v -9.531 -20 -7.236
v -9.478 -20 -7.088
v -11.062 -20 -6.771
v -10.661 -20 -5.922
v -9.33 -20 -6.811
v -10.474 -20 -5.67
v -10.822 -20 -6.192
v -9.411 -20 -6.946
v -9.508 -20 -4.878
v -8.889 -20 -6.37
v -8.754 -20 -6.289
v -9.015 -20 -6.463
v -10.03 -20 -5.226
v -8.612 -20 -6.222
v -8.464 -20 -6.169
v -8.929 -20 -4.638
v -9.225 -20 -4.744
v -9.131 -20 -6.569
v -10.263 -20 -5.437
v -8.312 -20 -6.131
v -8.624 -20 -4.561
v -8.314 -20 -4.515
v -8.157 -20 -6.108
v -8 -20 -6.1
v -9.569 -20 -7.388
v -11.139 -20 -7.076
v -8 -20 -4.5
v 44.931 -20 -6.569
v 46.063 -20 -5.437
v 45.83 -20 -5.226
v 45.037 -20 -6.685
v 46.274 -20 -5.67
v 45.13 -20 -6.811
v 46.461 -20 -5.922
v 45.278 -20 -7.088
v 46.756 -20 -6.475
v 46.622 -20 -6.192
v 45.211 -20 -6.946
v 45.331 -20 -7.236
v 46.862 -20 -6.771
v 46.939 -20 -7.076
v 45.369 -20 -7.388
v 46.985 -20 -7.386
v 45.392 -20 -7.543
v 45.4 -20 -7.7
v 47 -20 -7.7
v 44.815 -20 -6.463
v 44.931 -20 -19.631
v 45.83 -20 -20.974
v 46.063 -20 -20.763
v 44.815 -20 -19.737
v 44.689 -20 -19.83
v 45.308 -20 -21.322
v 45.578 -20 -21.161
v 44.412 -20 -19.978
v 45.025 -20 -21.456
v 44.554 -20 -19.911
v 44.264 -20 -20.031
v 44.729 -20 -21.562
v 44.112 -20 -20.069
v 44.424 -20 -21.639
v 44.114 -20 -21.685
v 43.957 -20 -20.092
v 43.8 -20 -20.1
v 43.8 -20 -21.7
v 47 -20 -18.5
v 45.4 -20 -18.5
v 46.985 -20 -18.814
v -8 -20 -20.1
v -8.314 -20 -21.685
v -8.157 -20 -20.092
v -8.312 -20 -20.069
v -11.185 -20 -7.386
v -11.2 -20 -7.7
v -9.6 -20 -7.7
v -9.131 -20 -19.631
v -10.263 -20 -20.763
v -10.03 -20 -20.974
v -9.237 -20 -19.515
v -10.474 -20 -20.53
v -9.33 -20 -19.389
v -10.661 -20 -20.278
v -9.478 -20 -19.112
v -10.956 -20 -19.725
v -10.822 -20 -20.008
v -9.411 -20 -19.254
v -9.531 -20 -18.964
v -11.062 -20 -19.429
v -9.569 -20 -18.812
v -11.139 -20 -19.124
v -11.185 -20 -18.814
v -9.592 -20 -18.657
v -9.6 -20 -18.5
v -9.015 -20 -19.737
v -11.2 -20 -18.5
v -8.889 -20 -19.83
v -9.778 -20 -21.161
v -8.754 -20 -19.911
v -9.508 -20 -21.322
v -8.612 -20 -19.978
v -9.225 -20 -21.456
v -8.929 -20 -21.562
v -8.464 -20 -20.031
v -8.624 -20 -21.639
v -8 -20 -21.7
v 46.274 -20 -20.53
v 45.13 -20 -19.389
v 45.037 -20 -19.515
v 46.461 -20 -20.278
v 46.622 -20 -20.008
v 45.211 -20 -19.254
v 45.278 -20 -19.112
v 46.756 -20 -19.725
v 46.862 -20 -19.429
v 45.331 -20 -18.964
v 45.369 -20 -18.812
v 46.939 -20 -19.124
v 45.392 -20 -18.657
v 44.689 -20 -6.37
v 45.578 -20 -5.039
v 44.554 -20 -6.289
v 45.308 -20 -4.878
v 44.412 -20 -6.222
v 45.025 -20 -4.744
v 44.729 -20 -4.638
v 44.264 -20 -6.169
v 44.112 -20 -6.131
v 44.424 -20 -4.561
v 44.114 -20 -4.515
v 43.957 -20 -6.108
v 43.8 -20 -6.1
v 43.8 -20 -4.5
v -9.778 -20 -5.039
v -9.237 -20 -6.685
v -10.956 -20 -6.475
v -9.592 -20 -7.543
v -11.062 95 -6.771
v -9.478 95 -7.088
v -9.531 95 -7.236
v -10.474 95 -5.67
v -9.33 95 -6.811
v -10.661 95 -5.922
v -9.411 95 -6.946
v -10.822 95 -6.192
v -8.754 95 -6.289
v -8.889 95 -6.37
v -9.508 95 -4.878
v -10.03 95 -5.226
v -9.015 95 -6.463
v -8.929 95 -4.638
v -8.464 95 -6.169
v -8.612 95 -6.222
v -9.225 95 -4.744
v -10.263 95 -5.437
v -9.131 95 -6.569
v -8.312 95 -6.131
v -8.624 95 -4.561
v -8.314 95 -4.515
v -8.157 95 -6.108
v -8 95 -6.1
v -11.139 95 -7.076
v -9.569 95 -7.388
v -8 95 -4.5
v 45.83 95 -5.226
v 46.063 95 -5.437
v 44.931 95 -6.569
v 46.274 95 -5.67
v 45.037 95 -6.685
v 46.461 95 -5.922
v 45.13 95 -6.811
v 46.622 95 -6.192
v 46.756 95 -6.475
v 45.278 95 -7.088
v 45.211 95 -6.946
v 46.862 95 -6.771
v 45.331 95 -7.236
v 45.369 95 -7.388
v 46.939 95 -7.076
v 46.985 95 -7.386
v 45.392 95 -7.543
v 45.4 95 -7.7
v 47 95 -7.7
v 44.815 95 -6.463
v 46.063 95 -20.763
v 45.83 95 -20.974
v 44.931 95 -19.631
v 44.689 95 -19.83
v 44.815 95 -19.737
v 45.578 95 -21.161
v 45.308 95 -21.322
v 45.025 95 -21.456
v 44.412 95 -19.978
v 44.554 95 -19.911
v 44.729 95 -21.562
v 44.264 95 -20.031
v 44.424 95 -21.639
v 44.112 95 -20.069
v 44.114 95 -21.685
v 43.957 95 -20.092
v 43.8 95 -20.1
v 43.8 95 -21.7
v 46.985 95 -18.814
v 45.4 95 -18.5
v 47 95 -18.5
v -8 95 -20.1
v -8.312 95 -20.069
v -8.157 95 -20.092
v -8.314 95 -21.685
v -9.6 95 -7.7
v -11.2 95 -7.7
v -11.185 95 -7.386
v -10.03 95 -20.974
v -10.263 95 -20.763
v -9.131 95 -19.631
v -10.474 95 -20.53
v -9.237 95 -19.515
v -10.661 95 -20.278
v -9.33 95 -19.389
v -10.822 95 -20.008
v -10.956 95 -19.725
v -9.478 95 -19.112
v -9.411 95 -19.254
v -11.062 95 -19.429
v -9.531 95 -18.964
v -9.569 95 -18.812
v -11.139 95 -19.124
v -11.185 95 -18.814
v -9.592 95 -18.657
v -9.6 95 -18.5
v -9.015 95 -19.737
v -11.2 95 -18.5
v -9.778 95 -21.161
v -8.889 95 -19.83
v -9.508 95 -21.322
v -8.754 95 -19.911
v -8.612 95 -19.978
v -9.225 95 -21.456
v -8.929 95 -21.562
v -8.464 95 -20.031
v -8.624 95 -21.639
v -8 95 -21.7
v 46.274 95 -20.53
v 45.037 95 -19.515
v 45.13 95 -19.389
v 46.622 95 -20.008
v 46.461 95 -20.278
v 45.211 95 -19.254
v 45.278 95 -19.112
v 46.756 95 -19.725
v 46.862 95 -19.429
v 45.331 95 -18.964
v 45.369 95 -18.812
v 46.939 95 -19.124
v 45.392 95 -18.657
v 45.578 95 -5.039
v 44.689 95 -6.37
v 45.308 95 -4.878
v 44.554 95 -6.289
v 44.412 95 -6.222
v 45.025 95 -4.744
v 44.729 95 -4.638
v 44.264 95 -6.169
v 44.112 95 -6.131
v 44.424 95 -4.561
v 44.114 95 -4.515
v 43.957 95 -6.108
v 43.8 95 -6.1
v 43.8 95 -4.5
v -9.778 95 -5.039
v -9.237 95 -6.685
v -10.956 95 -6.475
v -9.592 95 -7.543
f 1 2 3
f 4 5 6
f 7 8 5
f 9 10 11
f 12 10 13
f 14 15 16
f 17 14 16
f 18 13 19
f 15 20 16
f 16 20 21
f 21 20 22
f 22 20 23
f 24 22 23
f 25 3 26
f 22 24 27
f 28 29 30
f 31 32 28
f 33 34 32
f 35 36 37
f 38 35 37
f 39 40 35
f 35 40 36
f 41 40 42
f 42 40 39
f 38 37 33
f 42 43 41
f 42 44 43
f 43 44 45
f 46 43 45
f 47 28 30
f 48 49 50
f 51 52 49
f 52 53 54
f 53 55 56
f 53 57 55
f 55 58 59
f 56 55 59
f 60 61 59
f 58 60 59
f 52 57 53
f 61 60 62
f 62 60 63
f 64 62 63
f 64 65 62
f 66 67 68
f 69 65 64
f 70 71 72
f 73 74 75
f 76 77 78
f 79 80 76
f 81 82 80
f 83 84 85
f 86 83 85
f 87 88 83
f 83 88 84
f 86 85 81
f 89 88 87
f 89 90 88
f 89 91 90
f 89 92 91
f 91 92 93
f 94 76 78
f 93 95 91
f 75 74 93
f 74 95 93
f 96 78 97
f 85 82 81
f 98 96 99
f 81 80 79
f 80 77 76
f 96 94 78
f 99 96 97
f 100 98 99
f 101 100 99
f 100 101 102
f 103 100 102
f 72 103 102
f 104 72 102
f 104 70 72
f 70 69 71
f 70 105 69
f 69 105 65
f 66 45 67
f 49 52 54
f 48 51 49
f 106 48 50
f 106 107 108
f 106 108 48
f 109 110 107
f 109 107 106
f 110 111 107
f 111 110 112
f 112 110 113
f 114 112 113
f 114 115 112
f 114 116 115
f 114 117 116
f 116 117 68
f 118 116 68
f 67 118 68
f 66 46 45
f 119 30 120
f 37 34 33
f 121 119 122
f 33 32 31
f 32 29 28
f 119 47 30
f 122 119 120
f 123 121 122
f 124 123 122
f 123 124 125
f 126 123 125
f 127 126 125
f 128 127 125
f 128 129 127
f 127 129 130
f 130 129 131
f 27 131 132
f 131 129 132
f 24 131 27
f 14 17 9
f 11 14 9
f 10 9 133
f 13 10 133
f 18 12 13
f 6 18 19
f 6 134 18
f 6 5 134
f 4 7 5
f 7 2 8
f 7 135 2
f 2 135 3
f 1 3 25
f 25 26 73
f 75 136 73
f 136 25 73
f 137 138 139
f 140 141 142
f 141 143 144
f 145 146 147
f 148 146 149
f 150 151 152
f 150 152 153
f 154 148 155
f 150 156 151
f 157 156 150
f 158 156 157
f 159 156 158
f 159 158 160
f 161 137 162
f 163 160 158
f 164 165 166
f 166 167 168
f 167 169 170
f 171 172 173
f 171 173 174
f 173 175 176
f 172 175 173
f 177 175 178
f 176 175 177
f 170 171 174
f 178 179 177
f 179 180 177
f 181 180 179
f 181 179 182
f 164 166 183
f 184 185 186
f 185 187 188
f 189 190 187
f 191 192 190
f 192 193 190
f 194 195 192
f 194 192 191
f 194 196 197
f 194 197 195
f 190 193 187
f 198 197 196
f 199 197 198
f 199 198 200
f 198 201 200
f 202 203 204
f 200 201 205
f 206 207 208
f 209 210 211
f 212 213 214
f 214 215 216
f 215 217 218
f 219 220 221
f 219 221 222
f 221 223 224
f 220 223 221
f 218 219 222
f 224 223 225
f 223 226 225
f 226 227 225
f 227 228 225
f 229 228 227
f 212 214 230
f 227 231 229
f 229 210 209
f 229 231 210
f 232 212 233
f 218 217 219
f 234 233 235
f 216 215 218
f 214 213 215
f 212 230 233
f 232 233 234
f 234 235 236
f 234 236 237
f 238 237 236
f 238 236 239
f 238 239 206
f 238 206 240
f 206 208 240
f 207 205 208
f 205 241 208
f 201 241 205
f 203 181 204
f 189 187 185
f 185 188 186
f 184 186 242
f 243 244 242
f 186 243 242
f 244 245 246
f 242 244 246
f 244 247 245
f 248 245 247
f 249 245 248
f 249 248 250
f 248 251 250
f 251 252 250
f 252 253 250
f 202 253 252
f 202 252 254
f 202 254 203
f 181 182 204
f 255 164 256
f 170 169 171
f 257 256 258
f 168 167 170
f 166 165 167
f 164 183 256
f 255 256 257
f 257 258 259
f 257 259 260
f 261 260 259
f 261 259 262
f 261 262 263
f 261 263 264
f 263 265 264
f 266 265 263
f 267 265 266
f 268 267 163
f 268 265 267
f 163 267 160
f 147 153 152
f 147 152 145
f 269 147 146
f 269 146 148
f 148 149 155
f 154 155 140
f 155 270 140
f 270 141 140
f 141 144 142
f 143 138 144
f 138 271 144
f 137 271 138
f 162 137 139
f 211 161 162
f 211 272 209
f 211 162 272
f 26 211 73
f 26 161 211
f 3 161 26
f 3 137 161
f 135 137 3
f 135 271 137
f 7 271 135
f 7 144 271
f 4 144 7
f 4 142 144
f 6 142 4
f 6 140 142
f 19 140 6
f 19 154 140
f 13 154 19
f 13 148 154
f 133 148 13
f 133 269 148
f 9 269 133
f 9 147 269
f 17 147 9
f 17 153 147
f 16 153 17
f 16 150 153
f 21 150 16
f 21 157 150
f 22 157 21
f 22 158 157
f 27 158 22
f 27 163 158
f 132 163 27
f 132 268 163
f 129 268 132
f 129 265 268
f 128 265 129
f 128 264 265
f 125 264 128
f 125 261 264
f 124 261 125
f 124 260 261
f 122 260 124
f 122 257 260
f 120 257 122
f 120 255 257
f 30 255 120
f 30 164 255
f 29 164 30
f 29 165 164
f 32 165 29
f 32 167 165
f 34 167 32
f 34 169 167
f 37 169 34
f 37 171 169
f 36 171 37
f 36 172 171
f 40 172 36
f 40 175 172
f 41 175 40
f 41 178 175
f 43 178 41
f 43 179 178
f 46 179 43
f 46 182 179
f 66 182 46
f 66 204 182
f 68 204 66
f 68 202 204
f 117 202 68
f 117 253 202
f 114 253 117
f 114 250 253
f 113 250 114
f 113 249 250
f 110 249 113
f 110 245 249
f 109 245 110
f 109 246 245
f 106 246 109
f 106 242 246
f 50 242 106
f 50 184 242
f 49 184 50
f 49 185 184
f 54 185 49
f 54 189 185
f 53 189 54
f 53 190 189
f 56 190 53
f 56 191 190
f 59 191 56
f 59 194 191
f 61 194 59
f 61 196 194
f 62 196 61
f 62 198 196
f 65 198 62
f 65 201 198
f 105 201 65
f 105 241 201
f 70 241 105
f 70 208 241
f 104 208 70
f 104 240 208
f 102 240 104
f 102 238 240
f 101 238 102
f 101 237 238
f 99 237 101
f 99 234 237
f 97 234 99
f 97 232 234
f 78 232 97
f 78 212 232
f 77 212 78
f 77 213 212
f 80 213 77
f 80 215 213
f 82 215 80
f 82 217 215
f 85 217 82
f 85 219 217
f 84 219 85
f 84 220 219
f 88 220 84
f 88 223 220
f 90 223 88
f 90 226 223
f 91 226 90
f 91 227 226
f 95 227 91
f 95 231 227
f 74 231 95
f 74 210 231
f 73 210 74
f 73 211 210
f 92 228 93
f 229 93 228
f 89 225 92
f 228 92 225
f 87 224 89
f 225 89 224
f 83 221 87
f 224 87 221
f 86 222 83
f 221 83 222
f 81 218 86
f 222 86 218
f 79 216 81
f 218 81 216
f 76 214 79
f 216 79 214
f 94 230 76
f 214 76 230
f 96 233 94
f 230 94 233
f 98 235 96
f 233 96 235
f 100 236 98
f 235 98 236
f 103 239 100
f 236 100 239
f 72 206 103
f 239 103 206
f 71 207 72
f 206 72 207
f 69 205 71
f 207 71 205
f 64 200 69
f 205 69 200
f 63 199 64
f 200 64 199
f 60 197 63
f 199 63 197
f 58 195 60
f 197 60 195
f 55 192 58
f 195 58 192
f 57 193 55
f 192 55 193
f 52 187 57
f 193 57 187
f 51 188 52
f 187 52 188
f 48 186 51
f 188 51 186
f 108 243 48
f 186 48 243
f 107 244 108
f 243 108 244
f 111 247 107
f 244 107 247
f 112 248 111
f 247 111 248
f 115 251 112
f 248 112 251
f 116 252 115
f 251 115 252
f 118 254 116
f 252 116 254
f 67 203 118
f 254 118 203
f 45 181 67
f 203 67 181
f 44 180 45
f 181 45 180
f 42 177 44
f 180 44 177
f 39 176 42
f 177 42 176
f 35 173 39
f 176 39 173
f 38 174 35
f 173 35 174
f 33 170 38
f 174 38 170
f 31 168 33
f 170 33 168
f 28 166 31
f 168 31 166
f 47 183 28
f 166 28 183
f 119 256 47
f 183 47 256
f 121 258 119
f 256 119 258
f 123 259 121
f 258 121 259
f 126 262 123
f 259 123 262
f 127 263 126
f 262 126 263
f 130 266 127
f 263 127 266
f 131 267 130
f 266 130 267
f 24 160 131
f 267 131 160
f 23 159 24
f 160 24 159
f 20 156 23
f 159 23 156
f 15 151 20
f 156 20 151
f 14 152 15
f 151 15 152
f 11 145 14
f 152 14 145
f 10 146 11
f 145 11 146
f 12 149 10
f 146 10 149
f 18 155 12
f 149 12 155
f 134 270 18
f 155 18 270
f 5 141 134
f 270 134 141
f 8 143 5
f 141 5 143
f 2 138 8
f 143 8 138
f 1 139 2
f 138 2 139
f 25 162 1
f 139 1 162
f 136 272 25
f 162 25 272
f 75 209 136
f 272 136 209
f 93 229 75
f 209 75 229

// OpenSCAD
// file: VslotCover_Cust.scad
module vslotCover(length, side_extension_width=0) {
	/* HIDDEN */
	side_add_w = side_extension_width;

	$fn = 1 * 60;

	top2_w = 1 * 9.6;
	top_w = 1 * 10; // 9.2 -v2> 9.6 -v3> 10
	w1 = 1 * 8.4;
	w2 = 1 * 6;
	w3 = 1 * 7.4; // 8 -v2> 7.4
	bottom_w = 1 * 5.8;

	h1 = 1 * 4; // 3.8 -v4> 4.0
	h2 = 1 * 2;
	h3 = 1 * 1.2;
	h_top_cover = 1 * 0.5;

	wall_thick = 1 * 0.8; //
	tb_thick = 1 * 0; // top-bottom thickness 0.8 -v3> 0.4 -v4> 0

	// MAIN

	rotate([- 90, 0, 0])
		linear_extrude(height = length) {
			difference() {
				polygon(points = [[- bottom_w / 2, 0],
						[- w3 / 2, h3],
						[- w2 / 2, h2],
						[- w1 / 2, h1],
						[- top2_w / 2, h1],
						[- top_w / 2, h1 + h_top_cover],
						[top_w / 2 + side_add_w, h1 + h_top_cover],
						[top2_w / 2 + side_add_w, h1],
						[w1 / 2, h1],
						[w2 / 2, h2],
						[w3 / 2, h3],
						[bottom_w / 2, 0]]);

				polygon(points = [[- bottom_w / 2 + wall_thick, tb_thick],
						[- w3 / 2 + wall_thick, h3],
						[- w2 / 2 + wall_thick, h2],
						[- w1 / 2 + wall_thick, h1],
						[w1 / 2 - wall_thick, h1],
						[w2 / 2 - wall_thick, h2],
						[w3 / 2 - wall_thick, h3],
						[bottom_w / 2 - wall_thick, tb_thick]]);
			}

		}
}

vslotCover(50,20);
// main file
use <VslotCover_Cust.scad>;

dlzkaKolajnic = 135;
rozchodKolajnic = 20;

sirkaKlieste = 55;

$fn = 64;

module boxKlieste() {
    hrubkaSteny = 1.6;
    vyskaBoxKlieste = 14;
    vonkajsiaVyskaBoxKlieste = vyskaBoxKlieste + 2 * hrubkaSteny;
    translate([- 8, -20, - vyskaBoxKlieste - 4.5])
        rotate([270, 270, 0])
            linear_extrude(dlzkaKolajnic - 20) difference() {
                offset(2 * hrubkaSteny) square([vyskaBoxKlieste - 2 * hrubkaSteny, sirkaKlieste - 2 * hrubkaSteny]);
                offset(hrubkaSteny) square([vyskaBoxKlieste - 2 * hrubkaSteny, sirkaKlieste - 2 * hrubkaSteny]);
            }
}

module test1() {
    vslotCover(dlzkaKolajnic - 40, rozchodKolajnic);
    translate([20, 0, 0]) vslotCover(dlzkaKolajnic - 40, 4);

    translate([0, 0, 0]) boxKlieste();
}

test1();

!boxKlieste();
